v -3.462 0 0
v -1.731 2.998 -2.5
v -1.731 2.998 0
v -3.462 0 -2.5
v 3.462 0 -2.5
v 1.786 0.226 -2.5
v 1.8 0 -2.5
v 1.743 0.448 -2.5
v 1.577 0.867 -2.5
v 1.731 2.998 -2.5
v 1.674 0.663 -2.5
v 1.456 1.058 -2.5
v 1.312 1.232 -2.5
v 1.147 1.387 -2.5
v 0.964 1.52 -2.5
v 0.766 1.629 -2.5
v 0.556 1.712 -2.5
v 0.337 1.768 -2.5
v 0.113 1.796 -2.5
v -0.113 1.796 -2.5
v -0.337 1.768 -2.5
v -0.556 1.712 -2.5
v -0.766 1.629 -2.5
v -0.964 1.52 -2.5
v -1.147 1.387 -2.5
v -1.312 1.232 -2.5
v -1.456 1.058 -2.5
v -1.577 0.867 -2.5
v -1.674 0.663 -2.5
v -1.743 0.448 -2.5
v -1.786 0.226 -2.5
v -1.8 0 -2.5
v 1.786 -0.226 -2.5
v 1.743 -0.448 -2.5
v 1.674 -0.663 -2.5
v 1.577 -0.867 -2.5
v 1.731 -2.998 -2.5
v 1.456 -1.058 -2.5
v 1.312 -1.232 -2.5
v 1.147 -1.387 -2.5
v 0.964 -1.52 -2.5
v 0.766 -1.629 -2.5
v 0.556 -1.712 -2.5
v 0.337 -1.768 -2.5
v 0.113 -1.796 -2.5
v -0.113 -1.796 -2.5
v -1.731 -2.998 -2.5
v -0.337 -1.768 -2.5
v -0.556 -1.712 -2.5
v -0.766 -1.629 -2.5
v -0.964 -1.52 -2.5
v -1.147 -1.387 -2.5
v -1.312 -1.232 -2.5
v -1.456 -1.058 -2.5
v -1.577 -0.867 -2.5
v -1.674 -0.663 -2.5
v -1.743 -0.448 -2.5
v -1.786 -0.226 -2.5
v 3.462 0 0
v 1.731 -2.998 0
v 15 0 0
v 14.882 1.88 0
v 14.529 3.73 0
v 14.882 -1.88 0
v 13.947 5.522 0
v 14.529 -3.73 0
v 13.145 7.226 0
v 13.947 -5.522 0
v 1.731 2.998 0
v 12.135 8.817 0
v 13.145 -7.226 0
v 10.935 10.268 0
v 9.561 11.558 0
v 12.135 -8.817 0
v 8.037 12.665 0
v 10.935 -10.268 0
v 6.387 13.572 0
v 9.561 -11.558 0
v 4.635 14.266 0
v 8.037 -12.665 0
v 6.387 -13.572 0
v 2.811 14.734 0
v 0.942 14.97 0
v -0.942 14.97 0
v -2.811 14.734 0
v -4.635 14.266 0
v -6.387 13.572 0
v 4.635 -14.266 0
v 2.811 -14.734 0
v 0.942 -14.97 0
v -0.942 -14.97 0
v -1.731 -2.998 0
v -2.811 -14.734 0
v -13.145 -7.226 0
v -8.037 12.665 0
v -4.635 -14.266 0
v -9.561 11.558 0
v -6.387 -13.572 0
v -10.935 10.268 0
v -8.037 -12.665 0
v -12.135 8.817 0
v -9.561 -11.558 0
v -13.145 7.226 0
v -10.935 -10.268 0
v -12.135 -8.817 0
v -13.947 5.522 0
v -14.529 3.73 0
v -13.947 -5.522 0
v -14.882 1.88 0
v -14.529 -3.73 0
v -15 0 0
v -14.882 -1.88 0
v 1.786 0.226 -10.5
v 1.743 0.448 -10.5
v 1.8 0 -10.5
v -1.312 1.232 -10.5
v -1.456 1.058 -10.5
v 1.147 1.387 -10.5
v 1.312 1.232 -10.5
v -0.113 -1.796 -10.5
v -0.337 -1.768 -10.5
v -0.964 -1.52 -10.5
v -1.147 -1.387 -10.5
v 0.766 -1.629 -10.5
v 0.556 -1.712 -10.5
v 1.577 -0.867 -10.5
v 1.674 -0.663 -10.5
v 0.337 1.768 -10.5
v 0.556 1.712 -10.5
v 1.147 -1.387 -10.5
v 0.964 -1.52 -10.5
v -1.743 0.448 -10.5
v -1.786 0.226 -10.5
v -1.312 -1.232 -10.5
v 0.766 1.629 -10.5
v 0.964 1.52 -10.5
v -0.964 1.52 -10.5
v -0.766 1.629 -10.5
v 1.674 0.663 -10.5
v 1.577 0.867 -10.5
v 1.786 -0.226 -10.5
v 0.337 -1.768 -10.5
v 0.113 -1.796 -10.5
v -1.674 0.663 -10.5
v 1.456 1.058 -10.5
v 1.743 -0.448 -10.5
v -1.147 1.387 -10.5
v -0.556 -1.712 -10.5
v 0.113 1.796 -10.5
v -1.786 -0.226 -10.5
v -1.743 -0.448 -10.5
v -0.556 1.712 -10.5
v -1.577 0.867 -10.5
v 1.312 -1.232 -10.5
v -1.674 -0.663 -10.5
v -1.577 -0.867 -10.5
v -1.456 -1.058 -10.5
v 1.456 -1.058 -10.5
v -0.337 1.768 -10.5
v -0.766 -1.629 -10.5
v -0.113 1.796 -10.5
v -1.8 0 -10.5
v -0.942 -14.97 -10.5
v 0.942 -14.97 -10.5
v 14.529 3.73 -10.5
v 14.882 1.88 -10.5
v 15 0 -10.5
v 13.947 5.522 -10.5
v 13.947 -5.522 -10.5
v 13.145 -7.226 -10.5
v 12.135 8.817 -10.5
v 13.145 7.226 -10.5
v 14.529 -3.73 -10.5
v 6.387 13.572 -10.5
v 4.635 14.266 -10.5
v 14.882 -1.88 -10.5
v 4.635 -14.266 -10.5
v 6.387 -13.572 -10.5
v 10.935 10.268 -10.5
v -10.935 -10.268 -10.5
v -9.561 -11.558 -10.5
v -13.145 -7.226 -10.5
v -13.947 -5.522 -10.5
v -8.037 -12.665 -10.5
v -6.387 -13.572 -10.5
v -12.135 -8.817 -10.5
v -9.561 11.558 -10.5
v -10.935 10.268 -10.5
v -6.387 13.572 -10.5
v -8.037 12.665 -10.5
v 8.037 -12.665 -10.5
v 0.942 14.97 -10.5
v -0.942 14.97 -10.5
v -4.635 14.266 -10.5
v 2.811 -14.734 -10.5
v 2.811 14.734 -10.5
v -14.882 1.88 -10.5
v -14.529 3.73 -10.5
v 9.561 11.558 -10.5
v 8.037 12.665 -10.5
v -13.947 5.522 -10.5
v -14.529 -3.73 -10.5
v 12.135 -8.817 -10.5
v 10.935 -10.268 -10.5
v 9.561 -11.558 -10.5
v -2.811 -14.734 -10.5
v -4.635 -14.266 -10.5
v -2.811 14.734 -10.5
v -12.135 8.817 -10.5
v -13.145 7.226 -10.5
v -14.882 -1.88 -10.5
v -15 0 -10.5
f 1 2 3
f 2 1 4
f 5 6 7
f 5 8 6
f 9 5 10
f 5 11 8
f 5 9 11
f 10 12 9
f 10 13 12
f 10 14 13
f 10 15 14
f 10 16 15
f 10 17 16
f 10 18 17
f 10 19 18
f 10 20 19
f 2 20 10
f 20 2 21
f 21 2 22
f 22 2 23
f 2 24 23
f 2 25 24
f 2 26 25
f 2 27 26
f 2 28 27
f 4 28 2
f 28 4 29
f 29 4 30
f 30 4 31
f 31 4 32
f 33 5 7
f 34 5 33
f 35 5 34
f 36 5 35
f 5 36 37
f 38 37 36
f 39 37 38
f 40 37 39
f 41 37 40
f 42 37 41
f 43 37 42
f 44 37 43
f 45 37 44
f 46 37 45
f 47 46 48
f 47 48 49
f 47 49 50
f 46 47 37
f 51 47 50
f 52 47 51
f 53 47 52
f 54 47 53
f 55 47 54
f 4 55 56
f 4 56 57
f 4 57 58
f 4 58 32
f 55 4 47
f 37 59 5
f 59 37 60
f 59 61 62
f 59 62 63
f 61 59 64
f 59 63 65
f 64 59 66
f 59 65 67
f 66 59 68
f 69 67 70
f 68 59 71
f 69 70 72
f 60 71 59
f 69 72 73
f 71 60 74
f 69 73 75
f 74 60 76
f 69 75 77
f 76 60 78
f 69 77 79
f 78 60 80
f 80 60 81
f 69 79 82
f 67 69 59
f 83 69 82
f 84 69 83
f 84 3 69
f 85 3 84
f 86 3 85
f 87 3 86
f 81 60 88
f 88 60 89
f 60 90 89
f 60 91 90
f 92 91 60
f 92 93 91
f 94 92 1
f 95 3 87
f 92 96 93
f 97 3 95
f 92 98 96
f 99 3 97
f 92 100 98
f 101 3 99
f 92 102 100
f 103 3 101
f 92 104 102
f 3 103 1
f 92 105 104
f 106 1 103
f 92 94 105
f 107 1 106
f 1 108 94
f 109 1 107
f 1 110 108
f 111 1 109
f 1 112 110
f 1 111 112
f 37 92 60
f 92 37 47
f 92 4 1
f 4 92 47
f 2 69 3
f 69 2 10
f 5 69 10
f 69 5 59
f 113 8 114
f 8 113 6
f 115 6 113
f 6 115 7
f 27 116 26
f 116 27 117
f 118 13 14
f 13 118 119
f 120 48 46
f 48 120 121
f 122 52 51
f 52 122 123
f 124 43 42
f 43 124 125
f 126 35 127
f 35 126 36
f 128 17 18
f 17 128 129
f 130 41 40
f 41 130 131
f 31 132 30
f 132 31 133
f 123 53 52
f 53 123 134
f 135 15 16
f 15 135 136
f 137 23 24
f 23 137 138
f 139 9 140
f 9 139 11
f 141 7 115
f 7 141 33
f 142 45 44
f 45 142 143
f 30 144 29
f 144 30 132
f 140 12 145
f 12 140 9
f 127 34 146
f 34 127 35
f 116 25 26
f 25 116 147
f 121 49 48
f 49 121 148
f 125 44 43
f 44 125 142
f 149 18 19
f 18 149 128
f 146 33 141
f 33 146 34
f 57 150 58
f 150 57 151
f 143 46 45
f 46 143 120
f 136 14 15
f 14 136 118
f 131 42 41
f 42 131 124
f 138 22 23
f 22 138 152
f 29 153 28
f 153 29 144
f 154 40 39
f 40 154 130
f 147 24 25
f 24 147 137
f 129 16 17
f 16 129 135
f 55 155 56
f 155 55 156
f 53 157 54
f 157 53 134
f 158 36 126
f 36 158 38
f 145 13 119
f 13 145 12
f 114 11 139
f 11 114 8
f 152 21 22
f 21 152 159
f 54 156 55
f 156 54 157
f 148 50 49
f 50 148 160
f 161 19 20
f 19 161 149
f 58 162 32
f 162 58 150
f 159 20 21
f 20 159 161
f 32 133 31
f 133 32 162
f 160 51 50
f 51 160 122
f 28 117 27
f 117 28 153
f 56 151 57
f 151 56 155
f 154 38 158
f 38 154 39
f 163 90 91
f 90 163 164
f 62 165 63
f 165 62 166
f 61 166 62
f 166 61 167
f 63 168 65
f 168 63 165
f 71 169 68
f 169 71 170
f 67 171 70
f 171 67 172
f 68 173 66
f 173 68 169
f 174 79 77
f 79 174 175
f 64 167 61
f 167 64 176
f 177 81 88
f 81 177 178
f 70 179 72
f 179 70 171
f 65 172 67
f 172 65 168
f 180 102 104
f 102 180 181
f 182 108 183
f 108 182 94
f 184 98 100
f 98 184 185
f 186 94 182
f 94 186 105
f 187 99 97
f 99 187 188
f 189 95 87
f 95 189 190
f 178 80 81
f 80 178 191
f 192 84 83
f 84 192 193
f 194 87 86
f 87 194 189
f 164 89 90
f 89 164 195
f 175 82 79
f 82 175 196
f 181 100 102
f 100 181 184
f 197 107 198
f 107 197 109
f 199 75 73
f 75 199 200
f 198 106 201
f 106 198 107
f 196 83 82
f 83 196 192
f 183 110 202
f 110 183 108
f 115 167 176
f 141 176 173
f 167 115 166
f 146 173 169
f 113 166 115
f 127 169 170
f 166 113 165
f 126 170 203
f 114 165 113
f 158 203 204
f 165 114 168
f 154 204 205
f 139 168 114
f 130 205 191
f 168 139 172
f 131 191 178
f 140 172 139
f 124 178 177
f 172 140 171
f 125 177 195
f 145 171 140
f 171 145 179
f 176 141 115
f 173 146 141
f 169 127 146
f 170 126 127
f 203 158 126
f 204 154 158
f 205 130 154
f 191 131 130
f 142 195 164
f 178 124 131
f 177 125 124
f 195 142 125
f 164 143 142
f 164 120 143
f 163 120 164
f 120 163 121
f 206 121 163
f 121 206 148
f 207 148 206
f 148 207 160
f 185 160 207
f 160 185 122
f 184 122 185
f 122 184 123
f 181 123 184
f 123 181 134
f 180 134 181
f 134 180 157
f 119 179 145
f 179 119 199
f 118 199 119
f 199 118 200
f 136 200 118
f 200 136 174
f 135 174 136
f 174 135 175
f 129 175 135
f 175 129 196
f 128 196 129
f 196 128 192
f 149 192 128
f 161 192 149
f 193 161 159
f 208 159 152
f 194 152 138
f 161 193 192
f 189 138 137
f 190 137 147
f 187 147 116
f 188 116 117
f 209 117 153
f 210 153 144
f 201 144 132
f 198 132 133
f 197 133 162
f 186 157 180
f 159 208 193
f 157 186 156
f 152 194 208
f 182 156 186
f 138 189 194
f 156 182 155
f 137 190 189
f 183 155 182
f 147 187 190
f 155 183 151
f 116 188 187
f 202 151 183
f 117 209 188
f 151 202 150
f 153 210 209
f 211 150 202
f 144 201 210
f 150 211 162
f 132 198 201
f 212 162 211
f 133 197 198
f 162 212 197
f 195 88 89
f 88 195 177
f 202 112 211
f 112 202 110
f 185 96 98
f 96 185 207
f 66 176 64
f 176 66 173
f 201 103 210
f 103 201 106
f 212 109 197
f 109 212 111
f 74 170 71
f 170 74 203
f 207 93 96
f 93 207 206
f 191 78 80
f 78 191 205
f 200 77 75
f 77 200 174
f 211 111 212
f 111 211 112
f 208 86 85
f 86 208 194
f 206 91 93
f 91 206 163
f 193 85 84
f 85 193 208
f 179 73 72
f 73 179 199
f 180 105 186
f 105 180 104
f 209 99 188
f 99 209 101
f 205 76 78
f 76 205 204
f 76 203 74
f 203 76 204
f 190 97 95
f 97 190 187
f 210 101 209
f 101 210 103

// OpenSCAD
$fn = 50;


difference() {
	union() {
		translate(v = [0, 0, -10.5000000000]) {
			cylinder(h = 10.5000000000, r = 15.0000000000);
		}
	}
	union() {
		translate(v = [0, 0, 0]) {
			rotate(a = [0, 0, 0]) {
				difference() {
					union() {
						translate(v = [0, 0, -2.5000000000]) {
							linear_extrude(height = 2.5000000000) {
								polygon(points = [[3.4620000000, 0.0000000000], [1.7310000000, 2.9981799479], [-1.7310000000, 2.9981799479], [-3.4620000000, 0.0000000000], [-1.7310000000, -2.9981799479], [1.7310000000, -2.9981799479]]);
							}
						}
					}
					union();
				}
			}
		}
		#translate(v = [0, 0, -100.0000000000]) {
			cylinder(h = 200, r = 1.8000000000);
		}
	}
}
